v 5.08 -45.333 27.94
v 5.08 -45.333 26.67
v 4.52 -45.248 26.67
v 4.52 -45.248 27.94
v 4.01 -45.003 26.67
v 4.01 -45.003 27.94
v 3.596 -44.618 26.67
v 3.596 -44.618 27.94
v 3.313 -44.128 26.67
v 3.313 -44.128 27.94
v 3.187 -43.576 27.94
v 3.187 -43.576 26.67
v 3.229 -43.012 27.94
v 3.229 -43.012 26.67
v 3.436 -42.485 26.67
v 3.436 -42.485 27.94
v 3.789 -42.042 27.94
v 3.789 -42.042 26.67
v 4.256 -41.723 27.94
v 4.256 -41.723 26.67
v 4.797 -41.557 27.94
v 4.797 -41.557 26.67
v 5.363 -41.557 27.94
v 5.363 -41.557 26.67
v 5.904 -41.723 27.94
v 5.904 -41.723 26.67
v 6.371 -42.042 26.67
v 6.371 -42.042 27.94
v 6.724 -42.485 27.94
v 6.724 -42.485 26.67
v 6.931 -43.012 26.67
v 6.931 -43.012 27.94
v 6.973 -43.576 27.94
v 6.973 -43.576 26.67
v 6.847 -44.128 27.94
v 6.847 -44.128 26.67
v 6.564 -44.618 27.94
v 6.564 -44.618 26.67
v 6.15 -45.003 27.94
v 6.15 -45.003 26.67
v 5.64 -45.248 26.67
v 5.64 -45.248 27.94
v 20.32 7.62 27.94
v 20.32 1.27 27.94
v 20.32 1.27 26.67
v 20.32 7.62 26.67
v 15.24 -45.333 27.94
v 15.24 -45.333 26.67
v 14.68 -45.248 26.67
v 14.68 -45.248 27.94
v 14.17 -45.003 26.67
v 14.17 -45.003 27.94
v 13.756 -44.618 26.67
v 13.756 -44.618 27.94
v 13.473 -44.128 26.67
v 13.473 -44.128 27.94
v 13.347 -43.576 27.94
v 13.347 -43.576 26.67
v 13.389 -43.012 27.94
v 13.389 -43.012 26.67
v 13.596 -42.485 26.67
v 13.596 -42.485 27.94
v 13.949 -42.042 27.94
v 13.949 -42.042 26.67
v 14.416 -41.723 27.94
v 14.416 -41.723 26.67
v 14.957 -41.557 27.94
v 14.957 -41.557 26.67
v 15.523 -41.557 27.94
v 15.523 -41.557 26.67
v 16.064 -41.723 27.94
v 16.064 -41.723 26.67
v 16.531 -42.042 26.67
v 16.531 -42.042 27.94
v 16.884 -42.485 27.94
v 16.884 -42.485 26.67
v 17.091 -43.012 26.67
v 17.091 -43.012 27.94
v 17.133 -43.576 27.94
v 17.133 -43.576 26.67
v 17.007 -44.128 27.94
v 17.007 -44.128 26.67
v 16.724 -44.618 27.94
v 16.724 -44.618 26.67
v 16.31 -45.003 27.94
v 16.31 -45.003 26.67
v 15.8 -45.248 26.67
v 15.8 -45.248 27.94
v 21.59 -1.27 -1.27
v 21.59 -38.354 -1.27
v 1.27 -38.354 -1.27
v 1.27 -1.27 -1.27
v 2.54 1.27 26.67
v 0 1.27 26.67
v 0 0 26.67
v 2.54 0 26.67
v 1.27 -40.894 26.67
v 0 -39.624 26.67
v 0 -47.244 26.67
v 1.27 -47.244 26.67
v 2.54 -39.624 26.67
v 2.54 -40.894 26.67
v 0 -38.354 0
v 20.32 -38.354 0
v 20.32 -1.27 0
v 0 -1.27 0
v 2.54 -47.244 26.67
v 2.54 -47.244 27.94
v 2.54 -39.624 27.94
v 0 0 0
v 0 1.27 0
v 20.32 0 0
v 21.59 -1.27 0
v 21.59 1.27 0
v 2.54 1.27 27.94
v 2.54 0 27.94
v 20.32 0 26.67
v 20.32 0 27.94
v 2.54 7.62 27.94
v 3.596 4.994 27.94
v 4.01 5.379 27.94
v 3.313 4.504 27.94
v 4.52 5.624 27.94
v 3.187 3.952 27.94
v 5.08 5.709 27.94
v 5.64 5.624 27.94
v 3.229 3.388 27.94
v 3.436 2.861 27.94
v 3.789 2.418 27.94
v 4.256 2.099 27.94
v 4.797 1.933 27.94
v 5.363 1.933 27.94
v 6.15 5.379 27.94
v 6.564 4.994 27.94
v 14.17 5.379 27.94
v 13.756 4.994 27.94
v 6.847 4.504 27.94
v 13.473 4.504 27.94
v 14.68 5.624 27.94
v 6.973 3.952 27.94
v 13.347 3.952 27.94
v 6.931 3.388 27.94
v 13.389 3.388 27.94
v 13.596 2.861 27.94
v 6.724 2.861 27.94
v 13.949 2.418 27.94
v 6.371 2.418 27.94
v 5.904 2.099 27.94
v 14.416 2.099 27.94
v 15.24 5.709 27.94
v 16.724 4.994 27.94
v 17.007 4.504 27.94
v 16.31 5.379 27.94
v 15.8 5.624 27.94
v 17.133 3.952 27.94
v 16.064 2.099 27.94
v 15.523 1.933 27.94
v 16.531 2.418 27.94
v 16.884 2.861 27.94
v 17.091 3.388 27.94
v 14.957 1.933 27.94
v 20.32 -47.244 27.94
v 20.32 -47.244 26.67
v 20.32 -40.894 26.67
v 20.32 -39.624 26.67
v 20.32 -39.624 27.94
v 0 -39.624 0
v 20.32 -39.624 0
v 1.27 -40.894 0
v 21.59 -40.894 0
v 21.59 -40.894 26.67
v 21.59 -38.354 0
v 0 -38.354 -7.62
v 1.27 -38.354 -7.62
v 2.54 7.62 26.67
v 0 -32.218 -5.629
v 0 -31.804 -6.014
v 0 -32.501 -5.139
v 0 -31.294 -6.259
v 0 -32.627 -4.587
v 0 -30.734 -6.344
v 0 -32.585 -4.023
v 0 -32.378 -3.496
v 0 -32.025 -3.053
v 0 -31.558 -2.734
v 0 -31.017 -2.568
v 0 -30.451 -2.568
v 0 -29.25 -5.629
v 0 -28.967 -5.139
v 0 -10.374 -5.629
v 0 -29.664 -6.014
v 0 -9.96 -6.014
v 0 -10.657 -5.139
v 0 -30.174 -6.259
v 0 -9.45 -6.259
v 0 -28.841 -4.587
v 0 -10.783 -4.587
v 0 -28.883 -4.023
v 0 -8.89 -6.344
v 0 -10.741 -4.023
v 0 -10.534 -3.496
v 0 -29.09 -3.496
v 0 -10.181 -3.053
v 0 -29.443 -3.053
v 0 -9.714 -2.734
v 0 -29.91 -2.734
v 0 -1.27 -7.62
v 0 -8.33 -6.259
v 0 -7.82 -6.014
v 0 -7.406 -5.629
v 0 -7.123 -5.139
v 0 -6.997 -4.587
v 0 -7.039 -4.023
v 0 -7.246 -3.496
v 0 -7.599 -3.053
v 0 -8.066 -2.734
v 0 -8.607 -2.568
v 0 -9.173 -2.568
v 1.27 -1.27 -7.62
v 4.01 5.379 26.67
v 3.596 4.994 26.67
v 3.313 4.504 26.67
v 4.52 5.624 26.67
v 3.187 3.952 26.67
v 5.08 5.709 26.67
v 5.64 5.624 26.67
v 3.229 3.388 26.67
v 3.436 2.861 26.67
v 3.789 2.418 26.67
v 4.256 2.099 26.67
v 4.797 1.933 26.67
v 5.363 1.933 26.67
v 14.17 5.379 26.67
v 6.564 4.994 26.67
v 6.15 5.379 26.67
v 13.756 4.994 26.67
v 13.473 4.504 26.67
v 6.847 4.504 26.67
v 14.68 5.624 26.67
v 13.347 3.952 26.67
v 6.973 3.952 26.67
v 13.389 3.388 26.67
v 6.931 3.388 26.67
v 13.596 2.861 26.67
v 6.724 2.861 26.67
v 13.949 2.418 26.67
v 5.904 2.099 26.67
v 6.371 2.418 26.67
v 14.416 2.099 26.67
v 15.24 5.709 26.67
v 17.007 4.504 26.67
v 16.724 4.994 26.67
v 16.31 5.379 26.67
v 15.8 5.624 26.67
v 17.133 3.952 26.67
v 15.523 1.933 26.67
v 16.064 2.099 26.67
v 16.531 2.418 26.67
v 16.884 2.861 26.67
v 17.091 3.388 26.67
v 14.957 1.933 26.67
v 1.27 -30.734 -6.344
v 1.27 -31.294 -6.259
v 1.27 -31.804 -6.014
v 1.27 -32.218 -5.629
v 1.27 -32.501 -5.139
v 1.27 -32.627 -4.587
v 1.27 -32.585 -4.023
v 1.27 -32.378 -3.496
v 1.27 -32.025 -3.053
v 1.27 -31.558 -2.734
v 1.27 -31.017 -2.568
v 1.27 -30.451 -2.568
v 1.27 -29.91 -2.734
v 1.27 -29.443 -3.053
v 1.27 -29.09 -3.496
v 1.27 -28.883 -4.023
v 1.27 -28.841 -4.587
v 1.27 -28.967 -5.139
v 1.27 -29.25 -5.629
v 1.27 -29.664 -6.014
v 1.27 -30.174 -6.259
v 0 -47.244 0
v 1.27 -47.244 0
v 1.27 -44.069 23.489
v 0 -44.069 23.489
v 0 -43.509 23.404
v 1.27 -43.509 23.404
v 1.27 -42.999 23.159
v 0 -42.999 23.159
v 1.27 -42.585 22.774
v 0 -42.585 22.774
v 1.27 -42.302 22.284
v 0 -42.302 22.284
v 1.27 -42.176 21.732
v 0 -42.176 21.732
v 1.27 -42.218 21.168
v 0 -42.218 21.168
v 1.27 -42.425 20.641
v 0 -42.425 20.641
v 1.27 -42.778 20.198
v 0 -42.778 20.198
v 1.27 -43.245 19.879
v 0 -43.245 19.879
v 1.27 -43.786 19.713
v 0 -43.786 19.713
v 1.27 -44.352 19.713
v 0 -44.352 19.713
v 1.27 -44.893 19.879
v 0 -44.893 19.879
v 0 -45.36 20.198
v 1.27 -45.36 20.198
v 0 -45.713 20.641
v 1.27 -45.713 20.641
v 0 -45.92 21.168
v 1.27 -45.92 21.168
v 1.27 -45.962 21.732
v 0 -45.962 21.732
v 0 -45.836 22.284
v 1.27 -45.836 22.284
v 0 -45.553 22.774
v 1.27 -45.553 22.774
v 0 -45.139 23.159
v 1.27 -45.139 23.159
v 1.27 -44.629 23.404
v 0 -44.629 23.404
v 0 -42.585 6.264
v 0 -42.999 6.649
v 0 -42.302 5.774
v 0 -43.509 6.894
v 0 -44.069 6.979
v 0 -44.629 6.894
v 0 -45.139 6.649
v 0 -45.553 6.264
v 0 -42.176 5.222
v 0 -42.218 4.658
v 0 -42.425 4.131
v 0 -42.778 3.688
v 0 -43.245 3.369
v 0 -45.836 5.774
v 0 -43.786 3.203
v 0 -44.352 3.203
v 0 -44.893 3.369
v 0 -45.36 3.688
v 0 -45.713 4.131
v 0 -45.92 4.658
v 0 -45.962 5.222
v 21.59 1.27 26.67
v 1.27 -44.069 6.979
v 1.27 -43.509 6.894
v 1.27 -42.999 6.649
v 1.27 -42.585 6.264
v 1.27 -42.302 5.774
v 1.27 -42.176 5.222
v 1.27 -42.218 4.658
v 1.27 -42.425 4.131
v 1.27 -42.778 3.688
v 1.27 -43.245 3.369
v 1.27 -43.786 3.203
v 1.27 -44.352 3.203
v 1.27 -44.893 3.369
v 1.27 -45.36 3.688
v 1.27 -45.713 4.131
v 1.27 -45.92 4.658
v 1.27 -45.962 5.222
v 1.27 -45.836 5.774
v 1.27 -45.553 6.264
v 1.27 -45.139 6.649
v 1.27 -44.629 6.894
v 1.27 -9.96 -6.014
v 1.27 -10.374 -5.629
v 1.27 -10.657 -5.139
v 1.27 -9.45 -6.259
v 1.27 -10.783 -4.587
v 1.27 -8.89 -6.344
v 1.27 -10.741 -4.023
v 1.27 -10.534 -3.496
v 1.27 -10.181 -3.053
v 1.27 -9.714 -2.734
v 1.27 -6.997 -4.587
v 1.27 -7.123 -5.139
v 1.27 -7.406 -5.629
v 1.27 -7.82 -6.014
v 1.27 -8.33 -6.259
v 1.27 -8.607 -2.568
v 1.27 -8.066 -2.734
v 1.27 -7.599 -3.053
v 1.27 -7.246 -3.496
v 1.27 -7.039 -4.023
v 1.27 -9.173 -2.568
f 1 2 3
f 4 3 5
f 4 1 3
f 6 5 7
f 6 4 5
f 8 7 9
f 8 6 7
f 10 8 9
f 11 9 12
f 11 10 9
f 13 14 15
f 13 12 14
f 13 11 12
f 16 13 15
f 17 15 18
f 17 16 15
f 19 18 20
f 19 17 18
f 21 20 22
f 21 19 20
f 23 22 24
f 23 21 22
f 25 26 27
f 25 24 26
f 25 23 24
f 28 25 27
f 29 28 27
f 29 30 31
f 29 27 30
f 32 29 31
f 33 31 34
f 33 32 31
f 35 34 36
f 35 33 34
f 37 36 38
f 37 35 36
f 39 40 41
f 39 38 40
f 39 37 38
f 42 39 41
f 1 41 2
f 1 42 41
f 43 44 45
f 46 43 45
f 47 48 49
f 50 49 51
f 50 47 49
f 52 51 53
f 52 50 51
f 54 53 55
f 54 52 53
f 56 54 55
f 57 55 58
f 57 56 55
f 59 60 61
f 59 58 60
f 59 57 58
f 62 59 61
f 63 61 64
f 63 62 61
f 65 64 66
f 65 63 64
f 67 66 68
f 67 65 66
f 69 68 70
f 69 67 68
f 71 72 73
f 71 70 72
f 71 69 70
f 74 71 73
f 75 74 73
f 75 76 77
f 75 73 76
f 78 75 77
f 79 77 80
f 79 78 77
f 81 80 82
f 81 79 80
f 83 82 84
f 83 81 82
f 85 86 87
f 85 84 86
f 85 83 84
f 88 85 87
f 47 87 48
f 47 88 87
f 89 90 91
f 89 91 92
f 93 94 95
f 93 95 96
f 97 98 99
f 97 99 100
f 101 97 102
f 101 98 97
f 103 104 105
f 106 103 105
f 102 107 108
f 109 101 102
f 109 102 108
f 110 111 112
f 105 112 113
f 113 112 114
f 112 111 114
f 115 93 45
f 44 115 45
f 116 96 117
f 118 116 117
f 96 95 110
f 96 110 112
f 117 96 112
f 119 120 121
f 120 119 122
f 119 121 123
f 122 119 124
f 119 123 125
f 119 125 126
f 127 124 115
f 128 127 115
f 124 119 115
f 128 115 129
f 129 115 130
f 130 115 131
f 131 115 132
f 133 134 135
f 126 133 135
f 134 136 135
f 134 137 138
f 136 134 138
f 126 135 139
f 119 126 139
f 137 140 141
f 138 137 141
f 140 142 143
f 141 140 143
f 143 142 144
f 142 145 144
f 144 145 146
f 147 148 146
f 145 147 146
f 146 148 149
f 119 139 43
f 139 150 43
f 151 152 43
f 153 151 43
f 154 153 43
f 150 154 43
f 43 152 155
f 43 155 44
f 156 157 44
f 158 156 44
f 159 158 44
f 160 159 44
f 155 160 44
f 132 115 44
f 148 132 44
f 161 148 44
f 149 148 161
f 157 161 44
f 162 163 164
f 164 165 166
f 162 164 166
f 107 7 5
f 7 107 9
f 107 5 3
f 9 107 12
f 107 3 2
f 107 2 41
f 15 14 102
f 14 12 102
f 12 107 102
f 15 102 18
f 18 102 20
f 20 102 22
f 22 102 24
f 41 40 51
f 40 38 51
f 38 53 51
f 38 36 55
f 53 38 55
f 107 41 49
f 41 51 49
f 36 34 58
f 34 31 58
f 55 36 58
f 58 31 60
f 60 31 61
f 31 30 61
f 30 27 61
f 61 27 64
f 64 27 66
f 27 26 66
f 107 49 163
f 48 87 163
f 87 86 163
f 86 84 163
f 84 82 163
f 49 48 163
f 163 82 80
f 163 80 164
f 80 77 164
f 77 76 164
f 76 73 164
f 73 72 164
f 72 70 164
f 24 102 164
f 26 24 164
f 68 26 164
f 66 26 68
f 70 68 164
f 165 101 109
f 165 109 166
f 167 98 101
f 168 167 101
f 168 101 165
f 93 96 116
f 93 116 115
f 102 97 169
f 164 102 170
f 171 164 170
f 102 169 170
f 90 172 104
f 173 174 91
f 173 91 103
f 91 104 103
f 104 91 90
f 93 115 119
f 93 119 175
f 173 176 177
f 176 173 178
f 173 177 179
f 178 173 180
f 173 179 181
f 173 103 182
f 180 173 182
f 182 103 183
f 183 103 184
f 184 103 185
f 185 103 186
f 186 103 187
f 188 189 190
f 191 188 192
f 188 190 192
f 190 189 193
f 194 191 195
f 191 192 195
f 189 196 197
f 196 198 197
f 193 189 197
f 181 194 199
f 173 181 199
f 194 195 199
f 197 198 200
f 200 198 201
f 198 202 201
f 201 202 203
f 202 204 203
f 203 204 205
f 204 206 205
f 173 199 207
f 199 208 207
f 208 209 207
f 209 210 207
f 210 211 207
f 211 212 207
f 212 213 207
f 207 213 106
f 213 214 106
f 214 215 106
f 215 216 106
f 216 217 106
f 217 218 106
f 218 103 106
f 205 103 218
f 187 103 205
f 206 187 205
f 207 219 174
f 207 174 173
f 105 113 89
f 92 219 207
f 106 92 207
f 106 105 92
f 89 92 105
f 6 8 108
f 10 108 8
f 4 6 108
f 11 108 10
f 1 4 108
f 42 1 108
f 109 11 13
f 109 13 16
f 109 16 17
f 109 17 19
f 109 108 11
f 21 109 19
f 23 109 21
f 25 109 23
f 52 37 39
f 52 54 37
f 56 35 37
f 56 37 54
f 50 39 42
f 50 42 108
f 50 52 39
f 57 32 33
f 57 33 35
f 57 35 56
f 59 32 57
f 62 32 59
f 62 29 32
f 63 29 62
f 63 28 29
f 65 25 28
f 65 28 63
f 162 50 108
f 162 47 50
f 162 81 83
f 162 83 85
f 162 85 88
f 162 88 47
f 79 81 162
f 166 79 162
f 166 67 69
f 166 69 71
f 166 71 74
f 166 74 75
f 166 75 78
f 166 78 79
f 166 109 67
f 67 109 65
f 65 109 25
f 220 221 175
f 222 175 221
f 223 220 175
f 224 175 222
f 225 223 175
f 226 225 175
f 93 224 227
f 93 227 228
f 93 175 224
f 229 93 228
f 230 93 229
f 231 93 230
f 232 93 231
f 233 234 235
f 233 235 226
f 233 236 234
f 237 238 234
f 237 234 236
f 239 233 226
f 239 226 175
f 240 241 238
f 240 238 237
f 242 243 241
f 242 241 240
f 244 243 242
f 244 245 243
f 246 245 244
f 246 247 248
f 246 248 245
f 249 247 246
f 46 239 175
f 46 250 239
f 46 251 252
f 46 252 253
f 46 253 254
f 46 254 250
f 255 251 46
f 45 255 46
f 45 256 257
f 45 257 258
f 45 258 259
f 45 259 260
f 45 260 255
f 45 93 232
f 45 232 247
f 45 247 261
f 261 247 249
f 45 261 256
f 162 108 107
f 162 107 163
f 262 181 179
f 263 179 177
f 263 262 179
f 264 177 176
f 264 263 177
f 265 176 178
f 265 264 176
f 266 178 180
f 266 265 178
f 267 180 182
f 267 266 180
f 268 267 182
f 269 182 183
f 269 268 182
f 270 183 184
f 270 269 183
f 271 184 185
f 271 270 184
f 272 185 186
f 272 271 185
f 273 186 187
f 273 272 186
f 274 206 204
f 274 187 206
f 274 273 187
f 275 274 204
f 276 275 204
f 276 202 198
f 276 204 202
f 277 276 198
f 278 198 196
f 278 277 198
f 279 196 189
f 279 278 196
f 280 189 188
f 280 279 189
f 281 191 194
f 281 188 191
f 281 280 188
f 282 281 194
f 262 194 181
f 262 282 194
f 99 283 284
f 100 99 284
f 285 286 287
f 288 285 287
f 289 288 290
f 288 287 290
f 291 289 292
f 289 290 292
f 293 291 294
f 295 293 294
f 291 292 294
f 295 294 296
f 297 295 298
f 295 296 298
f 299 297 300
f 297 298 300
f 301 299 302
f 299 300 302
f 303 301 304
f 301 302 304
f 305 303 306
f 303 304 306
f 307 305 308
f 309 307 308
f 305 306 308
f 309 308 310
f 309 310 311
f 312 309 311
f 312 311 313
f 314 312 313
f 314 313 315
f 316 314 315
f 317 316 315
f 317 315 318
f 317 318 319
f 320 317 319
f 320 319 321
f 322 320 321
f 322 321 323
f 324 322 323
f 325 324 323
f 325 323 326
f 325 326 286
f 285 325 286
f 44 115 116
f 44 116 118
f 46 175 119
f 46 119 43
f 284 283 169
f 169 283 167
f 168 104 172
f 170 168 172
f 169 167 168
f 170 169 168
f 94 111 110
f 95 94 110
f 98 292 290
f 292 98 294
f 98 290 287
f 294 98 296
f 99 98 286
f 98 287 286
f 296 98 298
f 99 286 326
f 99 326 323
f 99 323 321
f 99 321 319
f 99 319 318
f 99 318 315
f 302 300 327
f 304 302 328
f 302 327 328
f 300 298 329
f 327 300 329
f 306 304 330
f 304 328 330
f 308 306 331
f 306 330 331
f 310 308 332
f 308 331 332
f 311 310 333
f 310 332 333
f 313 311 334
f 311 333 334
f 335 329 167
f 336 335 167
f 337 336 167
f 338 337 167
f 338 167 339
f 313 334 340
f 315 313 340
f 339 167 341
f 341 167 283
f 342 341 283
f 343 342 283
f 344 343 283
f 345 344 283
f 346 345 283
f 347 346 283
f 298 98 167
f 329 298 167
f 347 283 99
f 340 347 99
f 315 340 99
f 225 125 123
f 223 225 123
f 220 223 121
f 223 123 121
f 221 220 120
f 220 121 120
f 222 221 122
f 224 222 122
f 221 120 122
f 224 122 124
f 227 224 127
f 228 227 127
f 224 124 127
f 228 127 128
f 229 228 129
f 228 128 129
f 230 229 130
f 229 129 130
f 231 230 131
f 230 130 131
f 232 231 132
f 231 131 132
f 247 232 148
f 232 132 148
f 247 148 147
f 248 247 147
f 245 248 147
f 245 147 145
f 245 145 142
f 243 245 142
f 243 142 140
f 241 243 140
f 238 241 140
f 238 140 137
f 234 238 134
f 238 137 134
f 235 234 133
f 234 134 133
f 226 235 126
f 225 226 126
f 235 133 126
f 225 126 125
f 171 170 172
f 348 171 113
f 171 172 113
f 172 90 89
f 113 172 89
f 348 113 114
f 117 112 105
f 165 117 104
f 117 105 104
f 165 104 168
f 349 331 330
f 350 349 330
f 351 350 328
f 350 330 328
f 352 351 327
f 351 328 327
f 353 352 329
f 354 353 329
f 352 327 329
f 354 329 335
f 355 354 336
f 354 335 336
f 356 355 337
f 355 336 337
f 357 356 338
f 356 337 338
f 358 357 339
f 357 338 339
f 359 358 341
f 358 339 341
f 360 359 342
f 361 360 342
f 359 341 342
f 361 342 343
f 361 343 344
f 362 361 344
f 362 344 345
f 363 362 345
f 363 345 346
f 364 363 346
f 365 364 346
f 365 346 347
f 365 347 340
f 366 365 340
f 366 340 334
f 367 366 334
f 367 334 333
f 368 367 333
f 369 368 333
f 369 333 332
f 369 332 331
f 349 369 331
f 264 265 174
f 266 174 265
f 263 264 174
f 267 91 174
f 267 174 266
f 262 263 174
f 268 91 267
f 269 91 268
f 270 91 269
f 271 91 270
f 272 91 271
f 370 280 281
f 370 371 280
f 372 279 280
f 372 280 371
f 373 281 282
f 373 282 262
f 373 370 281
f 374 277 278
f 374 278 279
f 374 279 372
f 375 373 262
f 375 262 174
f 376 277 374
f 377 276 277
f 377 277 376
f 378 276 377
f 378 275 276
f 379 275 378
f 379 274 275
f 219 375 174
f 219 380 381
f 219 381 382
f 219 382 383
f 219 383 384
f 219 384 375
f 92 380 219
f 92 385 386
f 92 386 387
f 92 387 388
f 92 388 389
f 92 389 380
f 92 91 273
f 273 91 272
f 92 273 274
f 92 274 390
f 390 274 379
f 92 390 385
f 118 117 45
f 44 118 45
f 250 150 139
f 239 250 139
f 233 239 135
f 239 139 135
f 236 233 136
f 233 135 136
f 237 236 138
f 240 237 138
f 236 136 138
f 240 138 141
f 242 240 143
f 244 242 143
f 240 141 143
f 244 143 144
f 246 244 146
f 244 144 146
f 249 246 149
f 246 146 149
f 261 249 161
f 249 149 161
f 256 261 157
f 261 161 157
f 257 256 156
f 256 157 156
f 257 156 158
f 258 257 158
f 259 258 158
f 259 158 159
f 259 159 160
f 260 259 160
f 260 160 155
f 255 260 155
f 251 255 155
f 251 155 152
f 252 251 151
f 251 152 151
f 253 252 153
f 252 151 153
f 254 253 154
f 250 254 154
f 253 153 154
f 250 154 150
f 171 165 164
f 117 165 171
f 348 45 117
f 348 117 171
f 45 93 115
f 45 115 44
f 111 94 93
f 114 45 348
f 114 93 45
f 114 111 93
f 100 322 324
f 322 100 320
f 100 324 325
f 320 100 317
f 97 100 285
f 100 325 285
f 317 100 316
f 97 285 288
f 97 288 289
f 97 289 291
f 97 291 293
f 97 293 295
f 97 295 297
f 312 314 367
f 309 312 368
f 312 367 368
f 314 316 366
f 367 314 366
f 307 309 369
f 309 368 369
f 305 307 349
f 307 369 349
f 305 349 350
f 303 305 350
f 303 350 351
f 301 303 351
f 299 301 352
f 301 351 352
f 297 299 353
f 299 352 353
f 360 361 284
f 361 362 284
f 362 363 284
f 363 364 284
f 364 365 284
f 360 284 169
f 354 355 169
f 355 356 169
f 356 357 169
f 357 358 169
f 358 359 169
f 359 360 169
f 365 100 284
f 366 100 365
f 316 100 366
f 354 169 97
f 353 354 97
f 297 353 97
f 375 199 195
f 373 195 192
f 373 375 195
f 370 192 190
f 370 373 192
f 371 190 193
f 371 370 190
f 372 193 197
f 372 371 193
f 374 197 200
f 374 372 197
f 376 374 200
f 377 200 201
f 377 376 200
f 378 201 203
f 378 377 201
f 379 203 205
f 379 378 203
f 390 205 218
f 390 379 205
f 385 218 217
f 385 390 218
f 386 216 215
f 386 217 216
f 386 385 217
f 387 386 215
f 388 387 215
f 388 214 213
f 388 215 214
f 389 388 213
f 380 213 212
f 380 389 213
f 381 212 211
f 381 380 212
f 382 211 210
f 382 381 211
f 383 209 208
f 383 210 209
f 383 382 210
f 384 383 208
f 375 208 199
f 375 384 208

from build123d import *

# Parameters (mm, degrees)
EXTRUDE_THIN1_DEPTH            = 26.67
F_6_CLEARANCE_HOLE4_D          = 3.7973
F_6_CLEARANCE_HOLE4_DEPTH      = 7.62
F_6_CLEARANCE_HOLE4_TIP        = 1.140824014
SKETCH4_W                      = 17.78
SKETCH4_H                      = 1.27
BOSS_EXTRUDE1_DEPTH            = 6.35
SKETCH7_W                      = 17.78
SKETCH7_H                      = 1.27
BOSS_EXTRUDE2_DEPTH            = 1.27
SKETCH5_W                      = 1.89865
SKETCH5_H                      = 1.270025
F_6_CLEARANCE_HOLE2_AT_2_COUNT = 2
F_6_CLEARANCE_HOLE2_AT_2_PITCH = 10.16
SKETCH8_W                      = 17.78
SKETCH8_H                      = 1.27
BOSS_EXTRUDE3_DEPTH            = 1.27
SKETCH9_W                      = 17.78
SKETCH9_H                      = 1.27
BOSS_EXTRUDE4_DEPTH            = 6.35
F_6_CLEARANCE_HOLE3_AT_2_COUNT = 2
F_6_CLEARANCE_HOLE3_AT_2_PITCH = 10.16
SKETCH15_W                     = 1.27
SKETCH15_H                     = 37.084
BOSS_EXTRUDE5_DEPTH            = 1.27
SKETCH17_W                     = 1.27
SKETCH17_H                     = 37.084
BOSS_EXTRUDE14_DEPTH           = 20.32
SKETCH18_W                     = 1.27
SKETCH18_H                     = 37.084
BOSS_EXTRUDE15_DEPTH           = 6.35
F_6_CLEARANCE_HOLE5_AT_2_COUNT = 2
F_6_CLEARANCE_HOLE5_AT_2_PITCH = 21.844


with BuildPart() as part:
    # Sketch1 → Extrude-Thin1 (new body)
    with BuildSketch(Plane.XY):
        Polygon((0, 0), (20.32, 0), (20.32, -39.624), (0, -39.624), (0, -47.244), (1.27, -47.244), (1.27, -40.894), (21.59, -40.894), (21.59, 1.27), (0, 1.27), align=None)
    extrude(amount=EXTRUDE_THIN1_DEPTH)

    # #6 Clearance Hole4
    with Locations(Plane(origin=(1.27, 0, 0), x_dir=(0, 0, -1), z_dir=(1, 0, 0))):
        with Locations((-21.59, -44.069), (-5.08, -44.069)):
            Hole(F_6_CLEARANCE_HOLE4_D / 2, depth=F_6_CLEARANCE_HOLE4_DEPTH)
            with Locations((0, 0, -(F_6_CLEARANCE_HOLE4_DEPTH + F_6_CLEARANCE_HOLE4_TIP / 2))):  # 118° drill point
                Cone(0, F_6_CLEARANCE_HOLE4_D / 2, F_6_CLEARANCE_HOLE4_TIP, mode=Mode.SUBTRACT)

    # Sketch7 → Boss-Extrude2 (add)
    with BuildSketch(Plane.XY.offset(26.67)):
        with Locations((11.43, 0.635)):
            Rectangle(SKETCH7_W, SKETCH7_H)
    extrude(amount=BOSS_EXTRUDE2_DEPTH)

    # Sketch8 → Boss-Extrude3 (add)
    with BuildSketch(Plane.XY.offset(26.67)):
        with Locations((11.43, -40.259)):
            Rectangle(SKETCH8_W, SKETCH8_H)
    extrude(amount=BOSS_EXTRUDE3_DEPTH)

    # Sketch9 → Boss-Extrude4 (add)
    with BuildSketch(Plane.XZ.offset(40.894)):
        with Locations((11.43, 27.305)):
            Rectangle(SKETCH9_W, SKETCH9_H)
    extrude(amount=BOSS_EXTRUDE4_DEPTH)

    # Sketch10 → #6 Clearance Hole3 (revolve, cut)
    with BuildSketch(Plane(origin=(15.24, -43.434, 27.94), x_dir=(0, -1, 0), z_dir=(1, 0, 0))):
        Polygon((0, 0), (0, 4.950824014), (1.89865, 3.81), (1.89865, 0), align=None)
    f_6_clearance_hole3 = revolve(axis=Axis((15.24, -43.434, 34.29), (0, 0, -1)), mode=Mode.SUBTRACT)

    # #6 Clearance Hole3 at 2: #6 Clearance Hole3 ×2
    with Locations(*[(-i * F_6_CLEARANCE_HOLE3_AT_2_PITCH, 0, 0) for i in range(1, F_6_CLEARANCE_HOLE3_AT_2_COUNT)]):
        add(f_6_clearance_hole3, mode=Mode.SUBTRACT)

    # Sketch15 → Boss-Extrude5 (add)
    with BuildSketch(Plane(origin=(0, 0, 0), x_dir=(-1, 0, 0), z_dir=(0, 0, -1))):
        with Locations((-20.955, -19.812)):
            Rectangle(SKETCH15_W, SKETCH15_H)
    extrude(amount=BOSS_EXTRUDE5_DEPTH)

    # Sketch17 → Boss-Extrude14 (add)
    with BuildSketch(Plane.ZY.offset(-20.32)):
        with Locations((-0.635, -19.812)):
            Rectangle(SKETCH17_W, SKETCH17_H)
    extrude(amount=BOSS_EXTRUDE14_DEPTH)

    # Sketch18 → Boss-Extrude15 (add)
    with BuildSketch(Plane(origin=(0, 0, -1.27), x_dir=(-1, 0, 0), z_dir=(0, 0, -1))):
        with Locations((-0.635, -19.812)):
            Rectangle(SKETCH18_W, SKETCH18_H)
    extrude(amount=BOSS_EXTRUDE15_DEPTH)

    # Sketch19 → #6 Clearance Hole5 (revolve, cut)
    with BuildSketch(Plane(origin=(1.27, -8.89, -4.445), x_dir=(0, 0, -1), z_dir=(0, 1, 0))):
        Polygon((0, 0), (0, 8.760824014), (1.89865, 7.62), (1.89865, 0), align=None)
    f_6_clearance_hole5 = revolve(axis=Axis((7.62, -8.89, -4.445), (-1, 0, 0)), mode=Mode.SUBTRACT)

    # #6 Clearance Hole5 at 2: #6 Clearance Hole5 ×2
    with Locations(*[(0, -i * F_6_CLEARANCE_HOLE5_AT_2_PITCH, 0) for i in range(1, F_6_CLEARANCE_HOLE5_AT_2_COUNT)]):
        add(f_6_clearance_hole5, mode=Mode.SUBTRACT)


with BuildPart() as body_2:
    # Sketch4 → Boss-Extrude1 (new body)
    with BuildSketch(Plane(origin=(0, 1.27, 0), x_dir=(1, 0, 0), z_dir=(0, 1, 0))):
        with Locations((11.43, -27.305)):
            Rectangle(SKETCH4_W, SKETCH4_H)
    extrude(amount=BOSS_EXTRUDE1_DEPTH)

    # Sketch5 → #6 Clearance Hole2 (revolve, cut)
    with BuildSketch(Plane(origin=(5.08, 3.81, 26.67), x_dir=(0, 1, 0), z_dir=(1, 0, 0))):
        with Locations((0.949325, 0.6350125)):
            Rectangle(SKETCH5_W, SKETCH5_H)
    f_6_clearance_hole2 = revolve(axis=Axis((5.08, 3.81, 20.32), (0, 0, 1)), mode=Mode.SUBTRACT)

    # #6 Clearance Hole2 at 2: #6 Clearance Hole2 ×2
    with Locations(*[(i * F_6_CLEARANCE_HOLE2_AT_2_PITCH, 0, 0) for i in range(1, F_6_CLEARANCE_HOLE2_AT_2_COUNT)]):
        add(f_6_clearance_hole2, mode=Mode.SUBTRACT)


solid = Compound([part.part, body_2.part])
